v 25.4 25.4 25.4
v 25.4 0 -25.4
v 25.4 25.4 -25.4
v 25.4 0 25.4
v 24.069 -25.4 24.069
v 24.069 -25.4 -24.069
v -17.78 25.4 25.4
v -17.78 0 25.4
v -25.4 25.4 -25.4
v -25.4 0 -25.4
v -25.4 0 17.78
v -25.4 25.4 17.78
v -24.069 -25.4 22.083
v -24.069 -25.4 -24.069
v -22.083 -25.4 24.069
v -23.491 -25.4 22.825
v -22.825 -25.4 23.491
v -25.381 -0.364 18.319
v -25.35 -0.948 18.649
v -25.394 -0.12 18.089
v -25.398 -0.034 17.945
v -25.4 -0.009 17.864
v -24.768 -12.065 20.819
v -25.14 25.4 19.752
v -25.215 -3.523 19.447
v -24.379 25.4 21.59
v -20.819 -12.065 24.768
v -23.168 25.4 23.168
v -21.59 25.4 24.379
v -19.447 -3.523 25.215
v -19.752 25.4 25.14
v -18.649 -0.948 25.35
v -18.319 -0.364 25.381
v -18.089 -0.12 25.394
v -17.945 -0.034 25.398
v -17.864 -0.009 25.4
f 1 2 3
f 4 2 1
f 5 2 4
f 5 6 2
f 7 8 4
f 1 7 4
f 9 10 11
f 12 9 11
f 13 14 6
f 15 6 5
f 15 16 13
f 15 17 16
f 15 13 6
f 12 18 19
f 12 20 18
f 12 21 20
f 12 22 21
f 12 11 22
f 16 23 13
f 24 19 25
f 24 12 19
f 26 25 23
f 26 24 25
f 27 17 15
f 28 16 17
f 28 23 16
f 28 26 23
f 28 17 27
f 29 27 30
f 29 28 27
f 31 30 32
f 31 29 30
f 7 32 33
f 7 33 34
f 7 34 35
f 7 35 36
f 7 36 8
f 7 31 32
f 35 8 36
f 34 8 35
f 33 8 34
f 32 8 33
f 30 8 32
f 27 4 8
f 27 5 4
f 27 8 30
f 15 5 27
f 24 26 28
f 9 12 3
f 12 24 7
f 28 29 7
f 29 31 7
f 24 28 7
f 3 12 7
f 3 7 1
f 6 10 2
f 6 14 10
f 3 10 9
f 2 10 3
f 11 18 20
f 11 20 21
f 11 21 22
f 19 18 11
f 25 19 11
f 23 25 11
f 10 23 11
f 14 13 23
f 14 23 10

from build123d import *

# Parameters (mm, degrees)
F0_W          = 50.8
F0_H          = 50.8
F1_DEPTH      = 25.4
F1_TAPER      = 3
F1_DEPTH_BACK = 25.4
F2_T1_DEPTH   = 116.84


# Not quite as in the source:
# - a fillet or chamfer that OpenCascade refuses, or shapes differently, is made with other operations: its cross-section is extruded or revolved along the edge and cut away or added


with BuildPart() as f1:
    # F0 (on Front) → F1 (new body, two sides)
    with BuildSketch(Plane.XZ) as f1_sk:
        Rectangle(F0_W, F0_H)
    extrude(amount=F1_DEPTH, taper=F1_TAPER)
    extrude(f1_sk.sketch, amount=-F1_DEPTH_BACK)

    # F2: fillet of radius 7.62 on 1 edges, made by hand

    # F2_s2 → F2_t1 (cut)
    with BuildSketch(Plane.XZ.offset(-71.12)):
        with BuildLine():
            ThreePointArc((-25.4, 17.78), (-23.1681536726, 23.1681536726), (-17.78, 25.4))
            Line((-17.78, 25.4), (-17.78, 25.5524))
            Line((-17.78, 25.5524), (-25.5524, 25.5524))
            Line((-25.5524, 25.5524), (-25.5524, 17.78))
            Line((-25.5524, 17.78), (-25.4, 17.78))
        make_face()
    extrude(amount=F2_T1_DEPTH, mode=Mode.SUBTRACT)


solid = f1.part
